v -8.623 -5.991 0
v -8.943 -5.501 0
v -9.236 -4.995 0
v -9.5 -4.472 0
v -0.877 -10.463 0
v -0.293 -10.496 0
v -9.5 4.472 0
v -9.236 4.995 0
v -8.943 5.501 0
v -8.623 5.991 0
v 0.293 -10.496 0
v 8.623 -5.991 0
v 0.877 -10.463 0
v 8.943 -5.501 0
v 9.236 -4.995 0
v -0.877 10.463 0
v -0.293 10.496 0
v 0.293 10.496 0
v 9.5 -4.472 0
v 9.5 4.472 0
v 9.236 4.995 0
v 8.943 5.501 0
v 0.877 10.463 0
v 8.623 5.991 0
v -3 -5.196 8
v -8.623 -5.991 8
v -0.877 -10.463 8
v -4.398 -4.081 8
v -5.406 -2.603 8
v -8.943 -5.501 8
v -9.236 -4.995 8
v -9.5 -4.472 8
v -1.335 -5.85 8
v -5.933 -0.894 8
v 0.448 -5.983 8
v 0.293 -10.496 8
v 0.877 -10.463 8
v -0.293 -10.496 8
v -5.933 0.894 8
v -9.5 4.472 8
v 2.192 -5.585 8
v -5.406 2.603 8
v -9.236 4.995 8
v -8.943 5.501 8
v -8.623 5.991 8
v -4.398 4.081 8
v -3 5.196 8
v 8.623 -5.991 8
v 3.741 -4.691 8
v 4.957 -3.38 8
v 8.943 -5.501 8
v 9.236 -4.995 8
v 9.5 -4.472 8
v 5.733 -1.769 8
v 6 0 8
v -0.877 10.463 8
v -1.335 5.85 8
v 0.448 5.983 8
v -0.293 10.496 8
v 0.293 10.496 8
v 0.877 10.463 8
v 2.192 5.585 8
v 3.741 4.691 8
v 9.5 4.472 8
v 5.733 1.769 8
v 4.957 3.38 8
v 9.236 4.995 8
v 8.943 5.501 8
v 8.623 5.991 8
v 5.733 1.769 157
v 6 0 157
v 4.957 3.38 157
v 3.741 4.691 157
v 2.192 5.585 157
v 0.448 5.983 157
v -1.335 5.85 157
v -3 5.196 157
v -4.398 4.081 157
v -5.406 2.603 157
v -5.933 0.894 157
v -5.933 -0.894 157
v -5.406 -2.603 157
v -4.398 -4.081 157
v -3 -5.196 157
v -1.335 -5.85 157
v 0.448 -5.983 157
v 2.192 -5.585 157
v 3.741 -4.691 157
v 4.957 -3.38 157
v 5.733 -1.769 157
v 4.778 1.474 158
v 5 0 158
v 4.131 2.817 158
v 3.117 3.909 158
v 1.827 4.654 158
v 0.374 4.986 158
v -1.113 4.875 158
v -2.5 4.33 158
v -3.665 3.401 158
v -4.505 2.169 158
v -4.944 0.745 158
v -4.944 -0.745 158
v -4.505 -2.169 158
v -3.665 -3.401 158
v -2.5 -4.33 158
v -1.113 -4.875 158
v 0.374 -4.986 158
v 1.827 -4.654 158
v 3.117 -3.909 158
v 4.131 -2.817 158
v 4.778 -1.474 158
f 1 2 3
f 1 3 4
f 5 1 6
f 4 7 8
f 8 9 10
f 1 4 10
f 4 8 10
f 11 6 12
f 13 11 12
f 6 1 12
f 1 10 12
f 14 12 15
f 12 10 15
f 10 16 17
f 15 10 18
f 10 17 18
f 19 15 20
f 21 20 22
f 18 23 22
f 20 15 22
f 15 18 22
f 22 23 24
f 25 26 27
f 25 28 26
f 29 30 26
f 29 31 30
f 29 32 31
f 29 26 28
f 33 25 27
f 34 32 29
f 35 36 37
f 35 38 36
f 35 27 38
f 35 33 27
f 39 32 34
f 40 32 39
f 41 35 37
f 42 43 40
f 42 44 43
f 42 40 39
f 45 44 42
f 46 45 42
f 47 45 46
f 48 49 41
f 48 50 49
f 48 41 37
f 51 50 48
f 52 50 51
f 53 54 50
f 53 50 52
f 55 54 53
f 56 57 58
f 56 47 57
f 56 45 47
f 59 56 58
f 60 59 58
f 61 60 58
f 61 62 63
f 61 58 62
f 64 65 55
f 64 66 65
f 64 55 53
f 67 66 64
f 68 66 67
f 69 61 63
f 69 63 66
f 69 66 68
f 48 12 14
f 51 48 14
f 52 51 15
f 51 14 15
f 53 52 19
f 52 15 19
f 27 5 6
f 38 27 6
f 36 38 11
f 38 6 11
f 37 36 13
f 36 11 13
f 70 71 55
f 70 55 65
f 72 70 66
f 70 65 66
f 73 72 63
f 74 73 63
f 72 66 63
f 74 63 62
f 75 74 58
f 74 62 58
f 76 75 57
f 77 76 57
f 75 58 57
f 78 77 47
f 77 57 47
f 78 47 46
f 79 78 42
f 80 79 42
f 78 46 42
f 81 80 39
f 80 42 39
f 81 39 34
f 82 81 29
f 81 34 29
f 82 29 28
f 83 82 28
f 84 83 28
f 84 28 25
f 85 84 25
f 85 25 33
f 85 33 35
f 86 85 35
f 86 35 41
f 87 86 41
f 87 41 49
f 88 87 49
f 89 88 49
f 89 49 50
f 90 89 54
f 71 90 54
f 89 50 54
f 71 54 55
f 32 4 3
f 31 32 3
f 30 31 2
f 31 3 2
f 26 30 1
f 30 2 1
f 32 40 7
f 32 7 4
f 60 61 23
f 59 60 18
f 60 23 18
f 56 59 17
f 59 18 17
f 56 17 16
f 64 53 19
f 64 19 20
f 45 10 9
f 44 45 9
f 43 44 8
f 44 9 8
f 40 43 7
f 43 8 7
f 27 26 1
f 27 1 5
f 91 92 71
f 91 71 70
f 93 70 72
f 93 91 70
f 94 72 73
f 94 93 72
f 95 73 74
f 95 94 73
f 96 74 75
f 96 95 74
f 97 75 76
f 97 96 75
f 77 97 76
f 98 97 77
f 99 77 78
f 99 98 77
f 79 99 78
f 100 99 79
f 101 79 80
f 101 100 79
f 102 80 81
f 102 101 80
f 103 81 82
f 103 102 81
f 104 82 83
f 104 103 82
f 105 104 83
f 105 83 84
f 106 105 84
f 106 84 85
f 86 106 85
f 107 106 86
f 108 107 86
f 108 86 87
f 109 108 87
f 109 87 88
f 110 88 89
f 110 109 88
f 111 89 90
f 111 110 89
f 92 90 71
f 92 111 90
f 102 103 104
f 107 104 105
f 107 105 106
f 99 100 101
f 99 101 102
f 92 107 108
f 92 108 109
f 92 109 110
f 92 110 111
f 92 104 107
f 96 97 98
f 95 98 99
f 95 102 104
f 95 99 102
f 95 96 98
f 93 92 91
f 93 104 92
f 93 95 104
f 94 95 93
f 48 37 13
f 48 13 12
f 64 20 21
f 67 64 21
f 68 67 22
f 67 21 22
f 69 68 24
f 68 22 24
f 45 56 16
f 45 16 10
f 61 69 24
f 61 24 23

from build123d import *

# Parameters (mm, degrees)
SKETCH_1_R               = 10.5
EXTRUDE_226_DEPTH        = 8
CUT_EXTRUDE_1_DEPTH      = 17.867127793
PATTERN_CIRCULAR_1_COUNT = 6
SKETCH_3_R               = 6
EXTRUDE_1_DEPTH          = 150
CHAMFER_1_SIZE           = 1


with BuildPart() as part:
    # Эскиз1 → Extrude 226 (new body)
    with BuildSketch(Plane.XY):
        Circle(SKETCH_1_R)
    extrude(amount=EXTRUDE_226_DEPTH)

    # Эскиз2 → Вырез-Вытянуть1 (cut, through all)
    with BuildSketch(Plane.XY.offset(8)):
        with BuildLine():
            Line((-9.5, 4.472135955), (-9.5, -4.472135955))
            ThreePointArc((-9.5, -4.472135955), (-10.5, 0), (-9.5, 4.472135955))
        make_face()
    cut_extrude_1 = extrude(amount=-CUT_EXTRUDE_1_DEPTH, mode=Mode.SUBTRACT)

    # Круговой массив1: Вырез-Вытянуть1 ×6 about axis
    pattern_circular_1_axis = Axis((0, 0, 58), (0, 0, -1))
    for i in range(1, PATTERN_CIRCULAR_1_COUNT):
        add(cut_extrude_1.rotate(pattern_circular_1_axis, i * 360 / PATTERN_CIRCULAR_1_COUNT), mode=Mode.SUBTRACT)

    # Эскиз3 → Бобышка-Вытянуть1 (add)
    with BuildSketch(Plane.XY.offset(8)):
        Circle(SKETCH_3_R)
    extrude(amount=EXTRUDE_1_DEPTH)

    # Фаска1
    chamfer_1_edges = [part.edges().sort_by_distance(p)[0] for p in [
        (-6, 0, 158),
    ]]
    chamfer(chamfer_1_edges, length=CHAMFER_1_SIZE)


solid = part.part
